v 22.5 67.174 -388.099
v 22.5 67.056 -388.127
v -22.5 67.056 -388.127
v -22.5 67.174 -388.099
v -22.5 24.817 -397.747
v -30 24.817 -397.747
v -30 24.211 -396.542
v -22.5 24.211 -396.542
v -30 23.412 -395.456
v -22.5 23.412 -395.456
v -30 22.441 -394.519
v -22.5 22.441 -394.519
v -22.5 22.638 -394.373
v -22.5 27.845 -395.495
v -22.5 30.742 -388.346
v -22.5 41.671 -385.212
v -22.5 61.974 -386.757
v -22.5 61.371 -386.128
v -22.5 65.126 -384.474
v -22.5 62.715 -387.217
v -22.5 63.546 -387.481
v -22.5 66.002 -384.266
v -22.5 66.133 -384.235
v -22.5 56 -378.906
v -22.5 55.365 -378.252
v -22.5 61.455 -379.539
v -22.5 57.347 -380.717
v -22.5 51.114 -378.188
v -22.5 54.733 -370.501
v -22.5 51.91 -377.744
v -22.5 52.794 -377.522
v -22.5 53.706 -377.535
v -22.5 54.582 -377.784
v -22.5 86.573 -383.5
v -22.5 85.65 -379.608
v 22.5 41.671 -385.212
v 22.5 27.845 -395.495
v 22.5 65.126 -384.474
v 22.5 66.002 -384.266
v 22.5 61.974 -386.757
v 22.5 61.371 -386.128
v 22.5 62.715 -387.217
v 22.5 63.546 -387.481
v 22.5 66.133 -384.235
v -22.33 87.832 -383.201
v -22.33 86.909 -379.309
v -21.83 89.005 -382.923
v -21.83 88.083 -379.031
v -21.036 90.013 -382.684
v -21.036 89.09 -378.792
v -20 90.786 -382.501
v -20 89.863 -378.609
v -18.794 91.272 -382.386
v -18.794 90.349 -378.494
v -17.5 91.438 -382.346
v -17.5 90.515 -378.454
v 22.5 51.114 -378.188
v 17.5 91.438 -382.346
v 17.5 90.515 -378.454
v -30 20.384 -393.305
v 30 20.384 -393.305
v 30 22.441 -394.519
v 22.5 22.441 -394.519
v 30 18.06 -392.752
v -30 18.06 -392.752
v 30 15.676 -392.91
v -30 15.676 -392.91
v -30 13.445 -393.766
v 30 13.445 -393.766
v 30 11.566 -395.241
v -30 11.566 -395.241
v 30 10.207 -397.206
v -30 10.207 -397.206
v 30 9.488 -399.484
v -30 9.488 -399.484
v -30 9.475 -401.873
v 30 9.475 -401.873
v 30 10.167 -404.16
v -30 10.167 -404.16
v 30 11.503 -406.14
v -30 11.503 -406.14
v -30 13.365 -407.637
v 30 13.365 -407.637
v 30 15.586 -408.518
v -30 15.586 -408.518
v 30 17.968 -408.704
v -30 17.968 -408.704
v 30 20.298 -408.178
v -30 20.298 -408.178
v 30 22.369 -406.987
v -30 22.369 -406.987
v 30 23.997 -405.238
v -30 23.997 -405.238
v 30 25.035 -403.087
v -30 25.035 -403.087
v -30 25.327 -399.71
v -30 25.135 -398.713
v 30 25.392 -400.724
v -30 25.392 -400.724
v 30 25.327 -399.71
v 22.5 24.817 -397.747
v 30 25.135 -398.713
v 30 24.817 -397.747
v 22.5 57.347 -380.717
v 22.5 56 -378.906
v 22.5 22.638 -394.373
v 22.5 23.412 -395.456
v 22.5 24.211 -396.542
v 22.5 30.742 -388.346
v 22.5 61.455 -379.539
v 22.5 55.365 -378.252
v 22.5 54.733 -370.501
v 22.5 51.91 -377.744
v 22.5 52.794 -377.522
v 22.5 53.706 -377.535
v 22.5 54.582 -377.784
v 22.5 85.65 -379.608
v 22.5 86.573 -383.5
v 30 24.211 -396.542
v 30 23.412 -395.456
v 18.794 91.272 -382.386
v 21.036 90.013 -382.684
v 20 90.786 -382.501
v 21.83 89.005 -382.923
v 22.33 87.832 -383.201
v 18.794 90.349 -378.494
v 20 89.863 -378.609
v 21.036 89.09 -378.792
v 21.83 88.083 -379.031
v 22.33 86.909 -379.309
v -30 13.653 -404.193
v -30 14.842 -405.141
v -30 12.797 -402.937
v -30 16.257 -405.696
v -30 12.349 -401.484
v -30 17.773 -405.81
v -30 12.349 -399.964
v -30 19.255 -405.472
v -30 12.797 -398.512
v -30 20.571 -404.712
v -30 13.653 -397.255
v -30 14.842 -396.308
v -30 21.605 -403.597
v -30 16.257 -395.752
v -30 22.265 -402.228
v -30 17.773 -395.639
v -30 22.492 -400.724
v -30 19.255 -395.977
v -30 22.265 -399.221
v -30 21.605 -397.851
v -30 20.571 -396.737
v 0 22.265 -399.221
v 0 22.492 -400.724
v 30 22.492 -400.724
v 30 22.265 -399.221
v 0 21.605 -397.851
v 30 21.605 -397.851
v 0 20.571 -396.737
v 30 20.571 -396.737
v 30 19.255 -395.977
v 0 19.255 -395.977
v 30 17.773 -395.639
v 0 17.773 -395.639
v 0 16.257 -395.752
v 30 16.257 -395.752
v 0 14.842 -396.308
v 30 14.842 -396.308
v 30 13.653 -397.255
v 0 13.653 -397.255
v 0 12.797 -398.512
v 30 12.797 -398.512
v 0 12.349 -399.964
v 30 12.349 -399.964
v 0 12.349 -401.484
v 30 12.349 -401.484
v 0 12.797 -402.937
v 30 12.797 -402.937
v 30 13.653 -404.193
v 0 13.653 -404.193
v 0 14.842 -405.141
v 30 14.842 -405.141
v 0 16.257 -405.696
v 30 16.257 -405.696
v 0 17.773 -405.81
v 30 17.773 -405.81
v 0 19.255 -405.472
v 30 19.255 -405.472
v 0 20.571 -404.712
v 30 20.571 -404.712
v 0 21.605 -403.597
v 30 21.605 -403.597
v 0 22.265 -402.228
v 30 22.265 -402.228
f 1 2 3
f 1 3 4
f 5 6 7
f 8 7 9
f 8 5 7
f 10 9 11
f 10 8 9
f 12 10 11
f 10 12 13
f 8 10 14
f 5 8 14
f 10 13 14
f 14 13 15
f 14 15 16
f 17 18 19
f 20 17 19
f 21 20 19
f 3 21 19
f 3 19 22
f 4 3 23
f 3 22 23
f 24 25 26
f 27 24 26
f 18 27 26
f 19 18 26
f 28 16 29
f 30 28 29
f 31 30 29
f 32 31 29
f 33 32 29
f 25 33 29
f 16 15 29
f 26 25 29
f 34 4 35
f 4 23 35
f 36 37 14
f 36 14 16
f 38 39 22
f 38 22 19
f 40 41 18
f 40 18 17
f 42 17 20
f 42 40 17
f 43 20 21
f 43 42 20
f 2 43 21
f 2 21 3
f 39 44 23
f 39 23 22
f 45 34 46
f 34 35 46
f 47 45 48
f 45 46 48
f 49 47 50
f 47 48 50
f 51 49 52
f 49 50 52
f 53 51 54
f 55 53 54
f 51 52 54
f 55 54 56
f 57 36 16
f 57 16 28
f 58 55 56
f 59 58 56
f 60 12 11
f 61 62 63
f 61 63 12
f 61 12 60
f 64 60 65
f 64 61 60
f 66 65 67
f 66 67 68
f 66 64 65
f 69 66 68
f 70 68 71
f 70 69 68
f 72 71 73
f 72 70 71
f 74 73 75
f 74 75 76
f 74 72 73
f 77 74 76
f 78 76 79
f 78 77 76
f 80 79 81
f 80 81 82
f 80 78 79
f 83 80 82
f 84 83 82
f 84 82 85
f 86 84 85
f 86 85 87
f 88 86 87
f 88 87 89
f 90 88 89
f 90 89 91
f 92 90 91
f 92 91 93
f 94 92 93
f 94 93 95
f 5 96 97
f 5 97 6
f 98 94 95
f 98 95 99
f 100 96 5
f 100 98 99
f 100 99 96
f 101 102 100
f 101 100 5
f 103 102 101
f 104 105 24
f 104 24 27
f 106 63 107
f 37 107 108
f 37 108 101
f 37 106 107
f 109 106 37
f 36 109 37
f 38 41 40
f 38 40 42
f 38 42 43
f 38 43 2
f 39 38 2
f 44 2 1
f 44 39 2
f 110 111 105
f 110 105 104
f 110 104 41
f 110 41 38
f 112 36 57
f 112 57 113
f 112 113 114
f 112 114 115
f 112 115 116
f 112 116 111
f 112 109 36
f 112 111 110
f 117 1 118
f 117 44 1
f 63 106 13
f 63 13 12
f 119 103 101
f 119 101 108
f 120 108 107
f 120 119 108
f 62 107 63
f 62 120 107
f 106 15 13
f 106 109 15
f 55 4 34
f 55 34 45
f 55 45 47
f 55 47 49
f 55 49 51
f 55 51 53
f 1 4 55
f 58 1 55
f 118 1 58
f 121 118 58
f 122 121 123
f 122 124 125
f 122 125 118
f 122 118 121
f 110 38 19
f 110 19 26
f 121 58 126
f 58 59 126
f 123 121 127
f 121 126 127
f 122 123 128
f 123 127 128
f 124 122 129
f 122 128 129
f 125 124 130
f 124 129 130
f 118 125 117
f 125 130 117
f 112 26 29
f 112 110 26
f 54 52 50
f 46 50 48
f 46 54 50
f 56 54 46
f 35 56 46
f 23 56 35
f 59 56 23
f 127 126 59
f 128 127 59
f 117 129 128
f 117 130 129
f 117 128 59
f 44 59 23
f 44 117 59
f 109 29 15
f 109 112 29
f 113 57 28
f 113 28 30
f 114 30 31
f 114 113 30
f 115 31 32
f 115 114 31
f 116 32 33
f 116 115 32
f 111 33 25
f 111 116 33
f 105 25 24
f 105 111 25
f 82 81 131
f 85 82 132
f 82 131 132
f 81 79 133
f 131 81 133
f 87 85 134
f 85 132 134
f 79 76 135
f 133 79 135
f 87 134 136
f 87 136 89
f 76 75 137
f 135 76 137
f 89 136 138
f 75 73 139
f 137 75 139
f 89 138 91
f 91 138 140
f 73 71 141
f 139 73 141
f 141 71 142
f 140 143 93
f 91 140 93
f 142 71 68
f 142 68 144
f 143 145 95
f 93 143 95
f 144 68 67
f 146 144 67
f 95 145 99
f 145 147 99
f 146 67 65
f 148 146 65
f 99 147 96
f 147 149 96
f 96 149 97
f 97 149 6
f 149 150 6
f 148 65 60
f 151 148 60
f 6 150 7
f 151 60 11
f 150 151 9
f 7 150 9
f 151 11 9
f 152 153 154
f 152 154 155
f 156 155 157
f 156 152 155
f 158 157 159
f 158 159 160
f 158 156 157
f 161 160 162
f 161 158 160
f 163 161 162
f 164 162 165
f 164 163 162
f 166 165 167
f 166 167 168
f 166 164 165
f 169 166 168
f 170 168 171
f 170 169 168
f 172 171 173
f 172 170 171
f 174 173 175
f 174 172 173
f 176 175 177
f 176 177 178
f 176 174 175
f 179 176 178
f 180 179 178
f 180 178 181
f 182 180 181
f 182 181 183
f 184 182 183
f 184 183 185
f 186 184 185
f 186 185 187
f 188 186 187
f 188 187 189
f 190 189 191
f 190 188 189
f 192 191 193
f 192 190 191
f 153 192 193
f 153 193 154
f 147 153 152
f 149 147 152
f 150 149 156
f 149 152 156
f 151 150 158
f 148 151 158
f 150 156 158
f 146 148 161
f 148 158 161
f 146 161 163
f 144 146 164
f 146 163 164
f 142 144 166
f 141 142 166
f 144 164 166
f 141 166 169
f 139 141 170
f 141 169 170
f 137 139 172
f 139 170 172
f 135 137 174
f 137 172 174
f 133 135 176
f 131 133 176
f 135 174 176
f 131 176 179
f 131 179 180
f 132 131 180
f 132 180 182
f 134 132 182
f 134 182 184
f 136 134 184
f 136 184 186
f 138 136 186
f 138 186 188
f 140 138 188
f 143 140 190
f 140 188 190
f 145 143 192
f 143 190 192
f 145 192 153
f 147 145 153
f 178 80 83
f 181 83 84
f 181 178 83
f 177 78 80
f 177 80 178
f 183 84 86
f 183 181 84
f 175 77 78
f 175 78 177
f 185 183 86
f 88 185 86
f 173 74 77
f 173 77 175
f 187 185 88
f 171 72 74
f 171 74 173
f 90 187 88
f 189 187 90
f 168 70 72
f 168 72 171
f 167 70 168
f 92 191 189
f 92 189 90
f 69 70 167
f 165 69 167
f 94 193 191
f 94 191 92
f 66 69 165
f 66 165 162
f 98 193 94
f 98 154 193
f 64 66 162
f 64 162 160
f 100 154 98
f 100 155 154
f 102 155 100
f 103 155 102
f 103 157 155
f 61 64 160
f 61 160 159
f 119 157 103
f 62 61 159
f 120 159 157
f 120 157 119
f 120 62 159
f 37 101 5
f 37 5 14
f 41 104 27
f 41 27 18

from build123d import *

# Parameters (mm, degrees)
F0_R     = 5.1
F1_DEPTH = 30
F2_DEPTH = 22.5
F3_R     = 5


with BuildPart() as f1:
    # F0 (on Right) → F1 (new body, symmetric)
    with BuildSketch(Plane.YZ):
        with BuildLine():
            ThreePointArc((24.8170878902, -397.7473182194), (23.8345837656, -395.9821311786), (22.4412201864, -394.5193469909))
            ThreePointArc((22.4412201864, -394.5193469909), (10.1667790366, -404.1596589088), (25.391624, -400.724311))
            ThreePointArc((25.391624, -400.724311), (25.2466768681, -399.2083477949), (24.8170878902, -397.7473182194))
        make_face()
        with Locations((17.391624, -400.724311)):
            Circle(F0_R, mode=Mode.SUBTRACT)
    extrude(amount=F1_DEPTH, both=True)

    # F0 (on Right) → F2 (join, symmetric)
    with BuildSketch(Plane.YZ):
        with BuildLine():
            Line((41.6709488454, -385.2116712139), (30.7416916961, -388.3455854761))
            Line((30.7416916961, -388.3455854761), (22.637896, -394.373063))
            Line((22.637896, -394.373063), (22.936297, -394.774257))
            ThreePointArc((22.936297, -394.774257), (25.2411173155, -396.1514104487), (27.8446650687, -395.4954474882))
            Line((27.8446650687, -395.4954474882), (41.6709488454, -385.2116712139))
        make_face()
        with BuildLine():
            Line((57.3466358684, -380.7167399976), (61.4554451408, -379.5385578207))
            Line((61.4554451408, -379.5385578207), (54.733396, -370.500928))
            Line((54.733396, -370.500928), (30.7416916961, -388.3455854761))
            Line((30.7416916961, -388.3455854761), (41.6709488454, -385.2116712139))
            Line((41.6709488454, -385.2116712139), (51.1139020687, -378.1881484882))
            ThreePointArc((51.1139020687, -378.1881484882), (53.7055684242, -377.5351807229), (55.999871, -378.906048))
            Line((55.999871, -378.906048), (57.3466358684, -380.7167399976))
        make_face()
        with BuildLine():
            Line((65.1262132866, -384.4738153538), (61.4554451408, -379.5385578207))
            Line((61.4554451408, -379.5385578207), (57.3466358684, -380.7167399976))
            Line((57.3466358684, -380.7167399976), (61.371102, -386.127535))
            ThreePointArc((61.371102, -386.127535), (62.3300853011, -387.0102243008), (63.5455334662, -387.4808357451))
            ThreePointArc((63.5455334662, -387.4808357451), (64.9729225904, -387.4475961696), (66.26827, -386.84708))
            Line((66.26827, -386.84708), (66.669464, -386.548678))
            Line((66.669464, -386.548678), (65.1262132866, -384.4738153538))
        make_face()
        Polygon((66.132787, -384.235166), (66.6175101107, -386.2796280266), (67.1738194665, -388.0992339037), (91.437887, -382.346447), (90.515105, -378.454343), align=None)
        with BuildLine():
            Line((66.001939903, -384.2661886412), (65.1262132866, -384.4738153538))
            Line((65.1262132866, -384.4738153538), (66.669464, -386.548678))
            Line((66.669464, -386.548678), (66.26827, -386.84708))
            ThreePointArc((66.26827, -386.84708), (64.9729225904, -387.4475961696), (63.5455334662, -387.4808357451))
            Line((63.5455334662, -387.4808357451), (67.055569, -388.12727))
            Line((67.055569, -388.12727), (66.6175101107, -386.2796280266))
            Line((66.6175101107, -386.2796280266), (66.001939903, -384.2661886412))
        make_face()
        Polygon((66.132787, -384.235166), (66.001939903, -384.2661886412), (66.6175101107, -386.2796280266), align=None)
        Polygon((67.1738194665, -388.0992339037), (66.6175101107, -386.2796280266), (67.055569, -388.12727), align=None)
        with BuildLine():
            Line((22.936297, -394.774257), (22.637896, -394.373063))
            Line((22.637896, -394.373063), (22.4412201864, -394.5193469909))
            ThreePointArc((22.4412201864, -394.5193469909), (23.8345837656, -395.9821311786), (24.8170878902, -397.7473182194))
            Line((24.8170878902, -397.7473182194), (27.8446650687, -395.4954474882))
            ThreePointArc((27.8446650687, -395.4954474882), (25.2411173155, -396.1514104487), (22.936297, -394.774257))
        make_face()
    extrude(amount=F2_DEPTH, both=True)

    # F3
    f3_edges = [f1.edges().sort_by_distance(p)[0] for p in [
        (22.5, 90.976496, -380.400395),
        (-22.5, 90.976496, -380.400395),
    ]]
    fillet(f3_edges, radius=F3_R)


solid = f1.part
